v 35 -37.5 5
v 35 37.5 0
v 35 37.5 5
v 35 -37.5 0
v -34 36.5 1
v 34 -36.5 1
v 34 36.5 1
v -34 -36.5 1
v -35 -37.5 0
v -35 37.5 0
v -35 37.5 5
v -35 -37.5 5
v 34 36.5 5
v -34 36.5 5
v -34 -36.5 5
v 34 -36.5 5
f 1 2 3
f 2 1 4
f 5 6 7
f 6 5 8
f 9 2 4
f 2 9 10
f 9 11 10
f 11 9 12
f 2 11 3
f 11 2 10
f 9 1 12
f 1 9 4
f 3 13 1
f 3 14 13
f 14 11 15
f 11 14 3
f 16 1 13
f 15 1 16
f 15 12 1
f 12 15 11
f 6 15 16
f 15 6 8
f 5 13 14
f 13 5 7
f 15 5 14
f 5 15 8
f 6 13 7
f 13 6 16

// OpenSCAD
// file: ../settings.scad
// Common settings used by all scad files.

// ALL UNITS IN MILLIMETERS (MM)!!!

$fn = 30;//low-res but fast to render
//$fn = 50;//higher-res but slow to render

pi = 3.1415926535897932384626433832795;

max_footprint = 150; // 15x15 cm

bottom_clearance = 10;
bottom_clearance = 25.4/2+10;
//bottom_clearance = 30;

shell_alpha = 0.215;
//shell_alpha = 1.0;

tolerance = 0.5;

// Flat countersunk M2.5mm x 0.45mm machine screw.
screw_thread_diameter = 2.5;//2.8;//2.75;//2.4?
screw_thread_length = 5;//?
screw_head_diameter = 4.75; // M2.5
//screw_head_diameter = 5.2; // M3
screw_head_height = 1.5;//2;

screw_thread_diameter2 = 2;

unit_thickness = 5;
u = unit_thickness;

shell_thickness = unit_thickness;

// Show flags.
show_platform = 0;
show_head = 1;
show_head_shell = 0;
show_head_electronics_bb = 0;
show_battery = 1;
show_foot_cube = 0;
show_torso = 0;
show_motor = 0;
show_motor_plates = 1;
show_motor_inner_plates = 1;
show_motor_outer_plates = 1;
show_wheel = 0;//obsolete
show_tracks = 1;//
show_track_wheels = 1;
show_caster = 0;
show_rpi = 1;
show_vertical_plates = 1;//
show_horizontal_plates = 1;//
show_caster_plates = 0;//obsolete?
show_camera = 1;
show_screen = 0;
show_edge_mount = 1;
show_sonar_mount = 1;
show_recharge_mount = 1;
show_conduit = 1;
show_torso_shell = 1;
show_recharge_dock = 0;
show_head_tilt_axis = 0;
show_rpi_camera_axis = 0;
show_laser_axis = 0;

head_vertical_angle_tilt = 0;
//head_vertical_angle_tilt = 30;//max
//head_vertical_angle_tilt = 10;

torso_height = 120+20;

base_plate_diameter = max_footprint-unit_thickness*2;
base_plate_frame = 0;

head_height = 50;
head_offset_z = max_footprint/2;
head_middle_cutout = 85;

rpi_with_four_hats_and_clearance = 76;

qrd1114_w = 6.10;
qrd1114_l = 4.39;
qrd1114_h = 4.65;

dock_radius = 10;
dock_gripper_border = 2;
dock_gripper_instep = 0.9;
dock_gripper_cutout_tapper = 50;
dock_receiver_height = 5;

// Patriod Fuel+ 9000 mAh
battery_length = 90;
battery_width = 57;
battery_height = 23;
battery_offset_z = 30;//4;

wheel_diameter = 50;
wheel_offset_x = 65;
wheel_offset_z = wheel_diameter/2;
wheel_axle_diameter = 5;

//caster_diameter = 19.05; // 0.75 inches
caster_diameter = 25.45; // 1 inches
//caster_diameter = 15.875; // 5/8 inches
caster_holder_diameter = 30;//31;
caster_offset_y = base_plate_diameter/2 - caster_holder_diameter/2;

arduino_offset_x = 0;
arduino_offset_y = 0;
arduino_offset_z = 67;
arduino_offset_x2 = 0;
arduino_offset_y2 = -20;
arduino_offset_z2 = torso_height+bottom_clearance;

horizontal_plate_width = unit_thickness*8*2 - unit_thickness*2;
horizontal_plate_depth = unit_thickness*8*2;

vertical_plate_width = horizontal_plate_depth;
vertical_plate_height = unit_thickness*8;
vertical_plate_offset_x = wheel_offset_x-22.5;
vertical_plate_offset_z = vertical_plate_height/2 + unit_thickness/2;

vertical_battery_plate_height = 100 - 15;

caster_plate_width = horizontal_plate_width + unit_thickness*2;
caster_plate_mount_length = unit_thickness*4;
caster_plate_width_minor = caster_holder_diameter;

motor_switch_length = 20;
motor_switch_thickness = 6.5;
motor_switch_height = 11;
motor_switch_height_leads = 23;
motor_switch_on_height =  13.3;
motor_switch_hole_diameter = 2.5;
motor_switch_hole_offset_z = 6.5;//this plus diameter/2 is hole center from switch top
motor_switch_hole_spacing = 7.1;// holes are diameter/2 from this

motor_length = 60;
motor_width = 25;
motor_collar_width = 7;
motor_collar_height = 2.5;
motor_axle_width = 4;
motor_axle_height = 9.5;
motor_offset_x = 10;
//motor_offset_y = motor_width/2+5;
motor_offset_y = unit_thickness*3.5;
motor_offset_z = vertical_plate_height/2 - unit_thickness/2;//4;//30;
motor_mount_holes_dist = 17;
// motor countersink hole
motor_mount_holes_width = 3; // M3
motor_mount_holes_head_height = 2.2;
motor_mount_holes_head_width = 5.8;
motor_bearing_outer_diameter = 10;
motor_bearing_inner_diameter = 5.95;
motor_bearing_thickness = 2.5;

motor_unimount_idler_axle_d = screw_thread_diameter;
//motor_unimount_spacer_depth = 0.1;//too small
motor_unimount_spacer_depth = 0.5;

motor_arm_offset_y = -u*3;
motor_arm_offset_z = u*.5;

motor_plate_width = vertical_plate_width;
motor_plate_height = vertical_plate_height;
motor_plate_thickness = unit_thickness;
motor_plate_offset_z = vertical_plate_offset_z;

motor_plate_middle_thickness = 5;

wheel_hub_offset = u*3;

motor_hole_height_offset = -5;

nylon_spacer_outer_diameter = 6.35;
nylon_spacer_inner_diameter = 3.302;
nylon_spacer_length = 12.7;

track_width = unit_thickness*3;
track_offset_x = -50;
track_offset_z = .1;
//track_wheel_radius = 19;//original
track_wheel_radius = 14;
//track_wheel_hole_radius = (nylon_spacer_outer_diameter+1)/2;
track_wheel_hole_radius = motor_bearing_outer_diameter/2;

track_driver_hole_radius = (motor_axle_width)/2 + 0.1;
track_driver_set_screw_head_d = 4.1;
track_driver_set_screw_shaft_d = 2.4;
//track_wheel_width = 13.5;//original
track_wheel_width = u*2;
track_wheel_width_buffer = u*0.25;
track_offset = 3;        //distance from chassis
track_wheel_offset = track_offset;
//track_length = 250; // see tread_triangle.py, too big
//track_length = 240; // see tread_triangle.py
//track_length = 238; //inc/dec in 10 unit increments so notches match idlers
track_length = 228; //inc/dec in 10 unit increments so notches match idlers
track_radius = track_length/2/pi;
track_wheel_show_fancy = 1;
track_wheel_gap = track_wheel_width + track_wheel_width_buffer*2;
track_axle_bearing_diameter = motor_bearing_inner_diameter - 0.1;
track_tensioner_radius = 12;
track_nut_height = 3.5; //TODO
track_punchout_thickness = 0.25;//should be the same as the minimum layer thickness

head_slew_bearing_outer_diameter = 115;
head_slew_bearing_ring_thickness = 20;
head_slew_bearing_inner_diameter = head_slew_bearing_outer_diameter - head_slew_bearing_ring_thickness;
//head_slew_bearing_hole_diameter = head_slew_bearing_inner_diameter - head_slew_bearing_ring_thickness;
head_slew_bearing_hole_diameter = 12+tolerance; // slip ring https://www.adafruit.com/products/775
//head_slew_bearing_ball_diameter = 5;
head_slew_bearing_ball_diameter = 2.5; //u/2;
head_slew_bearing_height = u;//head_slew_bearing_ball_diameter*2;
head_slew_bearing_gap = 0.5;
head_slew_bearing_slew_gap = 0;
head_slew_bearing_gap_factor = 0.1;

neck_strut_width = u*7;
neck_strut_height = u*18;
neck_strut_spacing = u*8;

show_outer_race = 0;
show_inner_race_a = 1;
show_inner_race_b = 1;
show_balls = 0;
// main file
include <../settings.scad>;
use <plate.scad>;


// This supports the frame vertically and attaches to the horizontal support.
module make_plate_tray(width, depth, thickness=1, height=0, front=1, back=1, rail_width=u*0.5){
    
    height = height ? height : u;
    rail_cutout_height = screw_head_height+0.15;
//    d1 = screw_thread_diameter;
//    d2 = screw_head_diameter+0.1;
    d1 = 1;
    d2 = 1;
    rail_cutout_height = u*0.25;

    difference(){
        union(){
            translate([-width/2,-depth/2,0])
            cube([width,depth,thickness], center=false);
        
            // front rail
            if(front){
                color("red")
                translate([0, -(depth/2-rail_width/2), height/2])
                cube([width,rail_width,height], center=true);
            }
            
            // back rail
            if(back){
                color("red")
                translate([0, depth/2-rail_width/2, height/2])
                cube([width, rail_width, height], center=true);
            }
            
            // left rail
            color("blue")
            translate([-width/2+rail_width/2,0,height/2])
            cube([rail_width,depth,height], center=true);
            
            // right rail
            color("blue")
            translate([width/2-rail_width/2,0,height/2])
            cube([rail_width,depth,height], center=true);
        }
        /*
        translate([width/2-u*2,depth/2,u/2])
        rotate([90,0,0])
        cylinder(d=screw_thread_diameter+tolerance, h=u*2, center=true);
        
        translate([-(width/2-u*2),depth/2,u/2])
        rotate([90,0,0])
        cylinder(d=screw_thread_diameter+tolerance, h=u*2, center=true);
        */

    }//end diff
}

make_plate_tray(width=70, depth=75, rail_width=1);
